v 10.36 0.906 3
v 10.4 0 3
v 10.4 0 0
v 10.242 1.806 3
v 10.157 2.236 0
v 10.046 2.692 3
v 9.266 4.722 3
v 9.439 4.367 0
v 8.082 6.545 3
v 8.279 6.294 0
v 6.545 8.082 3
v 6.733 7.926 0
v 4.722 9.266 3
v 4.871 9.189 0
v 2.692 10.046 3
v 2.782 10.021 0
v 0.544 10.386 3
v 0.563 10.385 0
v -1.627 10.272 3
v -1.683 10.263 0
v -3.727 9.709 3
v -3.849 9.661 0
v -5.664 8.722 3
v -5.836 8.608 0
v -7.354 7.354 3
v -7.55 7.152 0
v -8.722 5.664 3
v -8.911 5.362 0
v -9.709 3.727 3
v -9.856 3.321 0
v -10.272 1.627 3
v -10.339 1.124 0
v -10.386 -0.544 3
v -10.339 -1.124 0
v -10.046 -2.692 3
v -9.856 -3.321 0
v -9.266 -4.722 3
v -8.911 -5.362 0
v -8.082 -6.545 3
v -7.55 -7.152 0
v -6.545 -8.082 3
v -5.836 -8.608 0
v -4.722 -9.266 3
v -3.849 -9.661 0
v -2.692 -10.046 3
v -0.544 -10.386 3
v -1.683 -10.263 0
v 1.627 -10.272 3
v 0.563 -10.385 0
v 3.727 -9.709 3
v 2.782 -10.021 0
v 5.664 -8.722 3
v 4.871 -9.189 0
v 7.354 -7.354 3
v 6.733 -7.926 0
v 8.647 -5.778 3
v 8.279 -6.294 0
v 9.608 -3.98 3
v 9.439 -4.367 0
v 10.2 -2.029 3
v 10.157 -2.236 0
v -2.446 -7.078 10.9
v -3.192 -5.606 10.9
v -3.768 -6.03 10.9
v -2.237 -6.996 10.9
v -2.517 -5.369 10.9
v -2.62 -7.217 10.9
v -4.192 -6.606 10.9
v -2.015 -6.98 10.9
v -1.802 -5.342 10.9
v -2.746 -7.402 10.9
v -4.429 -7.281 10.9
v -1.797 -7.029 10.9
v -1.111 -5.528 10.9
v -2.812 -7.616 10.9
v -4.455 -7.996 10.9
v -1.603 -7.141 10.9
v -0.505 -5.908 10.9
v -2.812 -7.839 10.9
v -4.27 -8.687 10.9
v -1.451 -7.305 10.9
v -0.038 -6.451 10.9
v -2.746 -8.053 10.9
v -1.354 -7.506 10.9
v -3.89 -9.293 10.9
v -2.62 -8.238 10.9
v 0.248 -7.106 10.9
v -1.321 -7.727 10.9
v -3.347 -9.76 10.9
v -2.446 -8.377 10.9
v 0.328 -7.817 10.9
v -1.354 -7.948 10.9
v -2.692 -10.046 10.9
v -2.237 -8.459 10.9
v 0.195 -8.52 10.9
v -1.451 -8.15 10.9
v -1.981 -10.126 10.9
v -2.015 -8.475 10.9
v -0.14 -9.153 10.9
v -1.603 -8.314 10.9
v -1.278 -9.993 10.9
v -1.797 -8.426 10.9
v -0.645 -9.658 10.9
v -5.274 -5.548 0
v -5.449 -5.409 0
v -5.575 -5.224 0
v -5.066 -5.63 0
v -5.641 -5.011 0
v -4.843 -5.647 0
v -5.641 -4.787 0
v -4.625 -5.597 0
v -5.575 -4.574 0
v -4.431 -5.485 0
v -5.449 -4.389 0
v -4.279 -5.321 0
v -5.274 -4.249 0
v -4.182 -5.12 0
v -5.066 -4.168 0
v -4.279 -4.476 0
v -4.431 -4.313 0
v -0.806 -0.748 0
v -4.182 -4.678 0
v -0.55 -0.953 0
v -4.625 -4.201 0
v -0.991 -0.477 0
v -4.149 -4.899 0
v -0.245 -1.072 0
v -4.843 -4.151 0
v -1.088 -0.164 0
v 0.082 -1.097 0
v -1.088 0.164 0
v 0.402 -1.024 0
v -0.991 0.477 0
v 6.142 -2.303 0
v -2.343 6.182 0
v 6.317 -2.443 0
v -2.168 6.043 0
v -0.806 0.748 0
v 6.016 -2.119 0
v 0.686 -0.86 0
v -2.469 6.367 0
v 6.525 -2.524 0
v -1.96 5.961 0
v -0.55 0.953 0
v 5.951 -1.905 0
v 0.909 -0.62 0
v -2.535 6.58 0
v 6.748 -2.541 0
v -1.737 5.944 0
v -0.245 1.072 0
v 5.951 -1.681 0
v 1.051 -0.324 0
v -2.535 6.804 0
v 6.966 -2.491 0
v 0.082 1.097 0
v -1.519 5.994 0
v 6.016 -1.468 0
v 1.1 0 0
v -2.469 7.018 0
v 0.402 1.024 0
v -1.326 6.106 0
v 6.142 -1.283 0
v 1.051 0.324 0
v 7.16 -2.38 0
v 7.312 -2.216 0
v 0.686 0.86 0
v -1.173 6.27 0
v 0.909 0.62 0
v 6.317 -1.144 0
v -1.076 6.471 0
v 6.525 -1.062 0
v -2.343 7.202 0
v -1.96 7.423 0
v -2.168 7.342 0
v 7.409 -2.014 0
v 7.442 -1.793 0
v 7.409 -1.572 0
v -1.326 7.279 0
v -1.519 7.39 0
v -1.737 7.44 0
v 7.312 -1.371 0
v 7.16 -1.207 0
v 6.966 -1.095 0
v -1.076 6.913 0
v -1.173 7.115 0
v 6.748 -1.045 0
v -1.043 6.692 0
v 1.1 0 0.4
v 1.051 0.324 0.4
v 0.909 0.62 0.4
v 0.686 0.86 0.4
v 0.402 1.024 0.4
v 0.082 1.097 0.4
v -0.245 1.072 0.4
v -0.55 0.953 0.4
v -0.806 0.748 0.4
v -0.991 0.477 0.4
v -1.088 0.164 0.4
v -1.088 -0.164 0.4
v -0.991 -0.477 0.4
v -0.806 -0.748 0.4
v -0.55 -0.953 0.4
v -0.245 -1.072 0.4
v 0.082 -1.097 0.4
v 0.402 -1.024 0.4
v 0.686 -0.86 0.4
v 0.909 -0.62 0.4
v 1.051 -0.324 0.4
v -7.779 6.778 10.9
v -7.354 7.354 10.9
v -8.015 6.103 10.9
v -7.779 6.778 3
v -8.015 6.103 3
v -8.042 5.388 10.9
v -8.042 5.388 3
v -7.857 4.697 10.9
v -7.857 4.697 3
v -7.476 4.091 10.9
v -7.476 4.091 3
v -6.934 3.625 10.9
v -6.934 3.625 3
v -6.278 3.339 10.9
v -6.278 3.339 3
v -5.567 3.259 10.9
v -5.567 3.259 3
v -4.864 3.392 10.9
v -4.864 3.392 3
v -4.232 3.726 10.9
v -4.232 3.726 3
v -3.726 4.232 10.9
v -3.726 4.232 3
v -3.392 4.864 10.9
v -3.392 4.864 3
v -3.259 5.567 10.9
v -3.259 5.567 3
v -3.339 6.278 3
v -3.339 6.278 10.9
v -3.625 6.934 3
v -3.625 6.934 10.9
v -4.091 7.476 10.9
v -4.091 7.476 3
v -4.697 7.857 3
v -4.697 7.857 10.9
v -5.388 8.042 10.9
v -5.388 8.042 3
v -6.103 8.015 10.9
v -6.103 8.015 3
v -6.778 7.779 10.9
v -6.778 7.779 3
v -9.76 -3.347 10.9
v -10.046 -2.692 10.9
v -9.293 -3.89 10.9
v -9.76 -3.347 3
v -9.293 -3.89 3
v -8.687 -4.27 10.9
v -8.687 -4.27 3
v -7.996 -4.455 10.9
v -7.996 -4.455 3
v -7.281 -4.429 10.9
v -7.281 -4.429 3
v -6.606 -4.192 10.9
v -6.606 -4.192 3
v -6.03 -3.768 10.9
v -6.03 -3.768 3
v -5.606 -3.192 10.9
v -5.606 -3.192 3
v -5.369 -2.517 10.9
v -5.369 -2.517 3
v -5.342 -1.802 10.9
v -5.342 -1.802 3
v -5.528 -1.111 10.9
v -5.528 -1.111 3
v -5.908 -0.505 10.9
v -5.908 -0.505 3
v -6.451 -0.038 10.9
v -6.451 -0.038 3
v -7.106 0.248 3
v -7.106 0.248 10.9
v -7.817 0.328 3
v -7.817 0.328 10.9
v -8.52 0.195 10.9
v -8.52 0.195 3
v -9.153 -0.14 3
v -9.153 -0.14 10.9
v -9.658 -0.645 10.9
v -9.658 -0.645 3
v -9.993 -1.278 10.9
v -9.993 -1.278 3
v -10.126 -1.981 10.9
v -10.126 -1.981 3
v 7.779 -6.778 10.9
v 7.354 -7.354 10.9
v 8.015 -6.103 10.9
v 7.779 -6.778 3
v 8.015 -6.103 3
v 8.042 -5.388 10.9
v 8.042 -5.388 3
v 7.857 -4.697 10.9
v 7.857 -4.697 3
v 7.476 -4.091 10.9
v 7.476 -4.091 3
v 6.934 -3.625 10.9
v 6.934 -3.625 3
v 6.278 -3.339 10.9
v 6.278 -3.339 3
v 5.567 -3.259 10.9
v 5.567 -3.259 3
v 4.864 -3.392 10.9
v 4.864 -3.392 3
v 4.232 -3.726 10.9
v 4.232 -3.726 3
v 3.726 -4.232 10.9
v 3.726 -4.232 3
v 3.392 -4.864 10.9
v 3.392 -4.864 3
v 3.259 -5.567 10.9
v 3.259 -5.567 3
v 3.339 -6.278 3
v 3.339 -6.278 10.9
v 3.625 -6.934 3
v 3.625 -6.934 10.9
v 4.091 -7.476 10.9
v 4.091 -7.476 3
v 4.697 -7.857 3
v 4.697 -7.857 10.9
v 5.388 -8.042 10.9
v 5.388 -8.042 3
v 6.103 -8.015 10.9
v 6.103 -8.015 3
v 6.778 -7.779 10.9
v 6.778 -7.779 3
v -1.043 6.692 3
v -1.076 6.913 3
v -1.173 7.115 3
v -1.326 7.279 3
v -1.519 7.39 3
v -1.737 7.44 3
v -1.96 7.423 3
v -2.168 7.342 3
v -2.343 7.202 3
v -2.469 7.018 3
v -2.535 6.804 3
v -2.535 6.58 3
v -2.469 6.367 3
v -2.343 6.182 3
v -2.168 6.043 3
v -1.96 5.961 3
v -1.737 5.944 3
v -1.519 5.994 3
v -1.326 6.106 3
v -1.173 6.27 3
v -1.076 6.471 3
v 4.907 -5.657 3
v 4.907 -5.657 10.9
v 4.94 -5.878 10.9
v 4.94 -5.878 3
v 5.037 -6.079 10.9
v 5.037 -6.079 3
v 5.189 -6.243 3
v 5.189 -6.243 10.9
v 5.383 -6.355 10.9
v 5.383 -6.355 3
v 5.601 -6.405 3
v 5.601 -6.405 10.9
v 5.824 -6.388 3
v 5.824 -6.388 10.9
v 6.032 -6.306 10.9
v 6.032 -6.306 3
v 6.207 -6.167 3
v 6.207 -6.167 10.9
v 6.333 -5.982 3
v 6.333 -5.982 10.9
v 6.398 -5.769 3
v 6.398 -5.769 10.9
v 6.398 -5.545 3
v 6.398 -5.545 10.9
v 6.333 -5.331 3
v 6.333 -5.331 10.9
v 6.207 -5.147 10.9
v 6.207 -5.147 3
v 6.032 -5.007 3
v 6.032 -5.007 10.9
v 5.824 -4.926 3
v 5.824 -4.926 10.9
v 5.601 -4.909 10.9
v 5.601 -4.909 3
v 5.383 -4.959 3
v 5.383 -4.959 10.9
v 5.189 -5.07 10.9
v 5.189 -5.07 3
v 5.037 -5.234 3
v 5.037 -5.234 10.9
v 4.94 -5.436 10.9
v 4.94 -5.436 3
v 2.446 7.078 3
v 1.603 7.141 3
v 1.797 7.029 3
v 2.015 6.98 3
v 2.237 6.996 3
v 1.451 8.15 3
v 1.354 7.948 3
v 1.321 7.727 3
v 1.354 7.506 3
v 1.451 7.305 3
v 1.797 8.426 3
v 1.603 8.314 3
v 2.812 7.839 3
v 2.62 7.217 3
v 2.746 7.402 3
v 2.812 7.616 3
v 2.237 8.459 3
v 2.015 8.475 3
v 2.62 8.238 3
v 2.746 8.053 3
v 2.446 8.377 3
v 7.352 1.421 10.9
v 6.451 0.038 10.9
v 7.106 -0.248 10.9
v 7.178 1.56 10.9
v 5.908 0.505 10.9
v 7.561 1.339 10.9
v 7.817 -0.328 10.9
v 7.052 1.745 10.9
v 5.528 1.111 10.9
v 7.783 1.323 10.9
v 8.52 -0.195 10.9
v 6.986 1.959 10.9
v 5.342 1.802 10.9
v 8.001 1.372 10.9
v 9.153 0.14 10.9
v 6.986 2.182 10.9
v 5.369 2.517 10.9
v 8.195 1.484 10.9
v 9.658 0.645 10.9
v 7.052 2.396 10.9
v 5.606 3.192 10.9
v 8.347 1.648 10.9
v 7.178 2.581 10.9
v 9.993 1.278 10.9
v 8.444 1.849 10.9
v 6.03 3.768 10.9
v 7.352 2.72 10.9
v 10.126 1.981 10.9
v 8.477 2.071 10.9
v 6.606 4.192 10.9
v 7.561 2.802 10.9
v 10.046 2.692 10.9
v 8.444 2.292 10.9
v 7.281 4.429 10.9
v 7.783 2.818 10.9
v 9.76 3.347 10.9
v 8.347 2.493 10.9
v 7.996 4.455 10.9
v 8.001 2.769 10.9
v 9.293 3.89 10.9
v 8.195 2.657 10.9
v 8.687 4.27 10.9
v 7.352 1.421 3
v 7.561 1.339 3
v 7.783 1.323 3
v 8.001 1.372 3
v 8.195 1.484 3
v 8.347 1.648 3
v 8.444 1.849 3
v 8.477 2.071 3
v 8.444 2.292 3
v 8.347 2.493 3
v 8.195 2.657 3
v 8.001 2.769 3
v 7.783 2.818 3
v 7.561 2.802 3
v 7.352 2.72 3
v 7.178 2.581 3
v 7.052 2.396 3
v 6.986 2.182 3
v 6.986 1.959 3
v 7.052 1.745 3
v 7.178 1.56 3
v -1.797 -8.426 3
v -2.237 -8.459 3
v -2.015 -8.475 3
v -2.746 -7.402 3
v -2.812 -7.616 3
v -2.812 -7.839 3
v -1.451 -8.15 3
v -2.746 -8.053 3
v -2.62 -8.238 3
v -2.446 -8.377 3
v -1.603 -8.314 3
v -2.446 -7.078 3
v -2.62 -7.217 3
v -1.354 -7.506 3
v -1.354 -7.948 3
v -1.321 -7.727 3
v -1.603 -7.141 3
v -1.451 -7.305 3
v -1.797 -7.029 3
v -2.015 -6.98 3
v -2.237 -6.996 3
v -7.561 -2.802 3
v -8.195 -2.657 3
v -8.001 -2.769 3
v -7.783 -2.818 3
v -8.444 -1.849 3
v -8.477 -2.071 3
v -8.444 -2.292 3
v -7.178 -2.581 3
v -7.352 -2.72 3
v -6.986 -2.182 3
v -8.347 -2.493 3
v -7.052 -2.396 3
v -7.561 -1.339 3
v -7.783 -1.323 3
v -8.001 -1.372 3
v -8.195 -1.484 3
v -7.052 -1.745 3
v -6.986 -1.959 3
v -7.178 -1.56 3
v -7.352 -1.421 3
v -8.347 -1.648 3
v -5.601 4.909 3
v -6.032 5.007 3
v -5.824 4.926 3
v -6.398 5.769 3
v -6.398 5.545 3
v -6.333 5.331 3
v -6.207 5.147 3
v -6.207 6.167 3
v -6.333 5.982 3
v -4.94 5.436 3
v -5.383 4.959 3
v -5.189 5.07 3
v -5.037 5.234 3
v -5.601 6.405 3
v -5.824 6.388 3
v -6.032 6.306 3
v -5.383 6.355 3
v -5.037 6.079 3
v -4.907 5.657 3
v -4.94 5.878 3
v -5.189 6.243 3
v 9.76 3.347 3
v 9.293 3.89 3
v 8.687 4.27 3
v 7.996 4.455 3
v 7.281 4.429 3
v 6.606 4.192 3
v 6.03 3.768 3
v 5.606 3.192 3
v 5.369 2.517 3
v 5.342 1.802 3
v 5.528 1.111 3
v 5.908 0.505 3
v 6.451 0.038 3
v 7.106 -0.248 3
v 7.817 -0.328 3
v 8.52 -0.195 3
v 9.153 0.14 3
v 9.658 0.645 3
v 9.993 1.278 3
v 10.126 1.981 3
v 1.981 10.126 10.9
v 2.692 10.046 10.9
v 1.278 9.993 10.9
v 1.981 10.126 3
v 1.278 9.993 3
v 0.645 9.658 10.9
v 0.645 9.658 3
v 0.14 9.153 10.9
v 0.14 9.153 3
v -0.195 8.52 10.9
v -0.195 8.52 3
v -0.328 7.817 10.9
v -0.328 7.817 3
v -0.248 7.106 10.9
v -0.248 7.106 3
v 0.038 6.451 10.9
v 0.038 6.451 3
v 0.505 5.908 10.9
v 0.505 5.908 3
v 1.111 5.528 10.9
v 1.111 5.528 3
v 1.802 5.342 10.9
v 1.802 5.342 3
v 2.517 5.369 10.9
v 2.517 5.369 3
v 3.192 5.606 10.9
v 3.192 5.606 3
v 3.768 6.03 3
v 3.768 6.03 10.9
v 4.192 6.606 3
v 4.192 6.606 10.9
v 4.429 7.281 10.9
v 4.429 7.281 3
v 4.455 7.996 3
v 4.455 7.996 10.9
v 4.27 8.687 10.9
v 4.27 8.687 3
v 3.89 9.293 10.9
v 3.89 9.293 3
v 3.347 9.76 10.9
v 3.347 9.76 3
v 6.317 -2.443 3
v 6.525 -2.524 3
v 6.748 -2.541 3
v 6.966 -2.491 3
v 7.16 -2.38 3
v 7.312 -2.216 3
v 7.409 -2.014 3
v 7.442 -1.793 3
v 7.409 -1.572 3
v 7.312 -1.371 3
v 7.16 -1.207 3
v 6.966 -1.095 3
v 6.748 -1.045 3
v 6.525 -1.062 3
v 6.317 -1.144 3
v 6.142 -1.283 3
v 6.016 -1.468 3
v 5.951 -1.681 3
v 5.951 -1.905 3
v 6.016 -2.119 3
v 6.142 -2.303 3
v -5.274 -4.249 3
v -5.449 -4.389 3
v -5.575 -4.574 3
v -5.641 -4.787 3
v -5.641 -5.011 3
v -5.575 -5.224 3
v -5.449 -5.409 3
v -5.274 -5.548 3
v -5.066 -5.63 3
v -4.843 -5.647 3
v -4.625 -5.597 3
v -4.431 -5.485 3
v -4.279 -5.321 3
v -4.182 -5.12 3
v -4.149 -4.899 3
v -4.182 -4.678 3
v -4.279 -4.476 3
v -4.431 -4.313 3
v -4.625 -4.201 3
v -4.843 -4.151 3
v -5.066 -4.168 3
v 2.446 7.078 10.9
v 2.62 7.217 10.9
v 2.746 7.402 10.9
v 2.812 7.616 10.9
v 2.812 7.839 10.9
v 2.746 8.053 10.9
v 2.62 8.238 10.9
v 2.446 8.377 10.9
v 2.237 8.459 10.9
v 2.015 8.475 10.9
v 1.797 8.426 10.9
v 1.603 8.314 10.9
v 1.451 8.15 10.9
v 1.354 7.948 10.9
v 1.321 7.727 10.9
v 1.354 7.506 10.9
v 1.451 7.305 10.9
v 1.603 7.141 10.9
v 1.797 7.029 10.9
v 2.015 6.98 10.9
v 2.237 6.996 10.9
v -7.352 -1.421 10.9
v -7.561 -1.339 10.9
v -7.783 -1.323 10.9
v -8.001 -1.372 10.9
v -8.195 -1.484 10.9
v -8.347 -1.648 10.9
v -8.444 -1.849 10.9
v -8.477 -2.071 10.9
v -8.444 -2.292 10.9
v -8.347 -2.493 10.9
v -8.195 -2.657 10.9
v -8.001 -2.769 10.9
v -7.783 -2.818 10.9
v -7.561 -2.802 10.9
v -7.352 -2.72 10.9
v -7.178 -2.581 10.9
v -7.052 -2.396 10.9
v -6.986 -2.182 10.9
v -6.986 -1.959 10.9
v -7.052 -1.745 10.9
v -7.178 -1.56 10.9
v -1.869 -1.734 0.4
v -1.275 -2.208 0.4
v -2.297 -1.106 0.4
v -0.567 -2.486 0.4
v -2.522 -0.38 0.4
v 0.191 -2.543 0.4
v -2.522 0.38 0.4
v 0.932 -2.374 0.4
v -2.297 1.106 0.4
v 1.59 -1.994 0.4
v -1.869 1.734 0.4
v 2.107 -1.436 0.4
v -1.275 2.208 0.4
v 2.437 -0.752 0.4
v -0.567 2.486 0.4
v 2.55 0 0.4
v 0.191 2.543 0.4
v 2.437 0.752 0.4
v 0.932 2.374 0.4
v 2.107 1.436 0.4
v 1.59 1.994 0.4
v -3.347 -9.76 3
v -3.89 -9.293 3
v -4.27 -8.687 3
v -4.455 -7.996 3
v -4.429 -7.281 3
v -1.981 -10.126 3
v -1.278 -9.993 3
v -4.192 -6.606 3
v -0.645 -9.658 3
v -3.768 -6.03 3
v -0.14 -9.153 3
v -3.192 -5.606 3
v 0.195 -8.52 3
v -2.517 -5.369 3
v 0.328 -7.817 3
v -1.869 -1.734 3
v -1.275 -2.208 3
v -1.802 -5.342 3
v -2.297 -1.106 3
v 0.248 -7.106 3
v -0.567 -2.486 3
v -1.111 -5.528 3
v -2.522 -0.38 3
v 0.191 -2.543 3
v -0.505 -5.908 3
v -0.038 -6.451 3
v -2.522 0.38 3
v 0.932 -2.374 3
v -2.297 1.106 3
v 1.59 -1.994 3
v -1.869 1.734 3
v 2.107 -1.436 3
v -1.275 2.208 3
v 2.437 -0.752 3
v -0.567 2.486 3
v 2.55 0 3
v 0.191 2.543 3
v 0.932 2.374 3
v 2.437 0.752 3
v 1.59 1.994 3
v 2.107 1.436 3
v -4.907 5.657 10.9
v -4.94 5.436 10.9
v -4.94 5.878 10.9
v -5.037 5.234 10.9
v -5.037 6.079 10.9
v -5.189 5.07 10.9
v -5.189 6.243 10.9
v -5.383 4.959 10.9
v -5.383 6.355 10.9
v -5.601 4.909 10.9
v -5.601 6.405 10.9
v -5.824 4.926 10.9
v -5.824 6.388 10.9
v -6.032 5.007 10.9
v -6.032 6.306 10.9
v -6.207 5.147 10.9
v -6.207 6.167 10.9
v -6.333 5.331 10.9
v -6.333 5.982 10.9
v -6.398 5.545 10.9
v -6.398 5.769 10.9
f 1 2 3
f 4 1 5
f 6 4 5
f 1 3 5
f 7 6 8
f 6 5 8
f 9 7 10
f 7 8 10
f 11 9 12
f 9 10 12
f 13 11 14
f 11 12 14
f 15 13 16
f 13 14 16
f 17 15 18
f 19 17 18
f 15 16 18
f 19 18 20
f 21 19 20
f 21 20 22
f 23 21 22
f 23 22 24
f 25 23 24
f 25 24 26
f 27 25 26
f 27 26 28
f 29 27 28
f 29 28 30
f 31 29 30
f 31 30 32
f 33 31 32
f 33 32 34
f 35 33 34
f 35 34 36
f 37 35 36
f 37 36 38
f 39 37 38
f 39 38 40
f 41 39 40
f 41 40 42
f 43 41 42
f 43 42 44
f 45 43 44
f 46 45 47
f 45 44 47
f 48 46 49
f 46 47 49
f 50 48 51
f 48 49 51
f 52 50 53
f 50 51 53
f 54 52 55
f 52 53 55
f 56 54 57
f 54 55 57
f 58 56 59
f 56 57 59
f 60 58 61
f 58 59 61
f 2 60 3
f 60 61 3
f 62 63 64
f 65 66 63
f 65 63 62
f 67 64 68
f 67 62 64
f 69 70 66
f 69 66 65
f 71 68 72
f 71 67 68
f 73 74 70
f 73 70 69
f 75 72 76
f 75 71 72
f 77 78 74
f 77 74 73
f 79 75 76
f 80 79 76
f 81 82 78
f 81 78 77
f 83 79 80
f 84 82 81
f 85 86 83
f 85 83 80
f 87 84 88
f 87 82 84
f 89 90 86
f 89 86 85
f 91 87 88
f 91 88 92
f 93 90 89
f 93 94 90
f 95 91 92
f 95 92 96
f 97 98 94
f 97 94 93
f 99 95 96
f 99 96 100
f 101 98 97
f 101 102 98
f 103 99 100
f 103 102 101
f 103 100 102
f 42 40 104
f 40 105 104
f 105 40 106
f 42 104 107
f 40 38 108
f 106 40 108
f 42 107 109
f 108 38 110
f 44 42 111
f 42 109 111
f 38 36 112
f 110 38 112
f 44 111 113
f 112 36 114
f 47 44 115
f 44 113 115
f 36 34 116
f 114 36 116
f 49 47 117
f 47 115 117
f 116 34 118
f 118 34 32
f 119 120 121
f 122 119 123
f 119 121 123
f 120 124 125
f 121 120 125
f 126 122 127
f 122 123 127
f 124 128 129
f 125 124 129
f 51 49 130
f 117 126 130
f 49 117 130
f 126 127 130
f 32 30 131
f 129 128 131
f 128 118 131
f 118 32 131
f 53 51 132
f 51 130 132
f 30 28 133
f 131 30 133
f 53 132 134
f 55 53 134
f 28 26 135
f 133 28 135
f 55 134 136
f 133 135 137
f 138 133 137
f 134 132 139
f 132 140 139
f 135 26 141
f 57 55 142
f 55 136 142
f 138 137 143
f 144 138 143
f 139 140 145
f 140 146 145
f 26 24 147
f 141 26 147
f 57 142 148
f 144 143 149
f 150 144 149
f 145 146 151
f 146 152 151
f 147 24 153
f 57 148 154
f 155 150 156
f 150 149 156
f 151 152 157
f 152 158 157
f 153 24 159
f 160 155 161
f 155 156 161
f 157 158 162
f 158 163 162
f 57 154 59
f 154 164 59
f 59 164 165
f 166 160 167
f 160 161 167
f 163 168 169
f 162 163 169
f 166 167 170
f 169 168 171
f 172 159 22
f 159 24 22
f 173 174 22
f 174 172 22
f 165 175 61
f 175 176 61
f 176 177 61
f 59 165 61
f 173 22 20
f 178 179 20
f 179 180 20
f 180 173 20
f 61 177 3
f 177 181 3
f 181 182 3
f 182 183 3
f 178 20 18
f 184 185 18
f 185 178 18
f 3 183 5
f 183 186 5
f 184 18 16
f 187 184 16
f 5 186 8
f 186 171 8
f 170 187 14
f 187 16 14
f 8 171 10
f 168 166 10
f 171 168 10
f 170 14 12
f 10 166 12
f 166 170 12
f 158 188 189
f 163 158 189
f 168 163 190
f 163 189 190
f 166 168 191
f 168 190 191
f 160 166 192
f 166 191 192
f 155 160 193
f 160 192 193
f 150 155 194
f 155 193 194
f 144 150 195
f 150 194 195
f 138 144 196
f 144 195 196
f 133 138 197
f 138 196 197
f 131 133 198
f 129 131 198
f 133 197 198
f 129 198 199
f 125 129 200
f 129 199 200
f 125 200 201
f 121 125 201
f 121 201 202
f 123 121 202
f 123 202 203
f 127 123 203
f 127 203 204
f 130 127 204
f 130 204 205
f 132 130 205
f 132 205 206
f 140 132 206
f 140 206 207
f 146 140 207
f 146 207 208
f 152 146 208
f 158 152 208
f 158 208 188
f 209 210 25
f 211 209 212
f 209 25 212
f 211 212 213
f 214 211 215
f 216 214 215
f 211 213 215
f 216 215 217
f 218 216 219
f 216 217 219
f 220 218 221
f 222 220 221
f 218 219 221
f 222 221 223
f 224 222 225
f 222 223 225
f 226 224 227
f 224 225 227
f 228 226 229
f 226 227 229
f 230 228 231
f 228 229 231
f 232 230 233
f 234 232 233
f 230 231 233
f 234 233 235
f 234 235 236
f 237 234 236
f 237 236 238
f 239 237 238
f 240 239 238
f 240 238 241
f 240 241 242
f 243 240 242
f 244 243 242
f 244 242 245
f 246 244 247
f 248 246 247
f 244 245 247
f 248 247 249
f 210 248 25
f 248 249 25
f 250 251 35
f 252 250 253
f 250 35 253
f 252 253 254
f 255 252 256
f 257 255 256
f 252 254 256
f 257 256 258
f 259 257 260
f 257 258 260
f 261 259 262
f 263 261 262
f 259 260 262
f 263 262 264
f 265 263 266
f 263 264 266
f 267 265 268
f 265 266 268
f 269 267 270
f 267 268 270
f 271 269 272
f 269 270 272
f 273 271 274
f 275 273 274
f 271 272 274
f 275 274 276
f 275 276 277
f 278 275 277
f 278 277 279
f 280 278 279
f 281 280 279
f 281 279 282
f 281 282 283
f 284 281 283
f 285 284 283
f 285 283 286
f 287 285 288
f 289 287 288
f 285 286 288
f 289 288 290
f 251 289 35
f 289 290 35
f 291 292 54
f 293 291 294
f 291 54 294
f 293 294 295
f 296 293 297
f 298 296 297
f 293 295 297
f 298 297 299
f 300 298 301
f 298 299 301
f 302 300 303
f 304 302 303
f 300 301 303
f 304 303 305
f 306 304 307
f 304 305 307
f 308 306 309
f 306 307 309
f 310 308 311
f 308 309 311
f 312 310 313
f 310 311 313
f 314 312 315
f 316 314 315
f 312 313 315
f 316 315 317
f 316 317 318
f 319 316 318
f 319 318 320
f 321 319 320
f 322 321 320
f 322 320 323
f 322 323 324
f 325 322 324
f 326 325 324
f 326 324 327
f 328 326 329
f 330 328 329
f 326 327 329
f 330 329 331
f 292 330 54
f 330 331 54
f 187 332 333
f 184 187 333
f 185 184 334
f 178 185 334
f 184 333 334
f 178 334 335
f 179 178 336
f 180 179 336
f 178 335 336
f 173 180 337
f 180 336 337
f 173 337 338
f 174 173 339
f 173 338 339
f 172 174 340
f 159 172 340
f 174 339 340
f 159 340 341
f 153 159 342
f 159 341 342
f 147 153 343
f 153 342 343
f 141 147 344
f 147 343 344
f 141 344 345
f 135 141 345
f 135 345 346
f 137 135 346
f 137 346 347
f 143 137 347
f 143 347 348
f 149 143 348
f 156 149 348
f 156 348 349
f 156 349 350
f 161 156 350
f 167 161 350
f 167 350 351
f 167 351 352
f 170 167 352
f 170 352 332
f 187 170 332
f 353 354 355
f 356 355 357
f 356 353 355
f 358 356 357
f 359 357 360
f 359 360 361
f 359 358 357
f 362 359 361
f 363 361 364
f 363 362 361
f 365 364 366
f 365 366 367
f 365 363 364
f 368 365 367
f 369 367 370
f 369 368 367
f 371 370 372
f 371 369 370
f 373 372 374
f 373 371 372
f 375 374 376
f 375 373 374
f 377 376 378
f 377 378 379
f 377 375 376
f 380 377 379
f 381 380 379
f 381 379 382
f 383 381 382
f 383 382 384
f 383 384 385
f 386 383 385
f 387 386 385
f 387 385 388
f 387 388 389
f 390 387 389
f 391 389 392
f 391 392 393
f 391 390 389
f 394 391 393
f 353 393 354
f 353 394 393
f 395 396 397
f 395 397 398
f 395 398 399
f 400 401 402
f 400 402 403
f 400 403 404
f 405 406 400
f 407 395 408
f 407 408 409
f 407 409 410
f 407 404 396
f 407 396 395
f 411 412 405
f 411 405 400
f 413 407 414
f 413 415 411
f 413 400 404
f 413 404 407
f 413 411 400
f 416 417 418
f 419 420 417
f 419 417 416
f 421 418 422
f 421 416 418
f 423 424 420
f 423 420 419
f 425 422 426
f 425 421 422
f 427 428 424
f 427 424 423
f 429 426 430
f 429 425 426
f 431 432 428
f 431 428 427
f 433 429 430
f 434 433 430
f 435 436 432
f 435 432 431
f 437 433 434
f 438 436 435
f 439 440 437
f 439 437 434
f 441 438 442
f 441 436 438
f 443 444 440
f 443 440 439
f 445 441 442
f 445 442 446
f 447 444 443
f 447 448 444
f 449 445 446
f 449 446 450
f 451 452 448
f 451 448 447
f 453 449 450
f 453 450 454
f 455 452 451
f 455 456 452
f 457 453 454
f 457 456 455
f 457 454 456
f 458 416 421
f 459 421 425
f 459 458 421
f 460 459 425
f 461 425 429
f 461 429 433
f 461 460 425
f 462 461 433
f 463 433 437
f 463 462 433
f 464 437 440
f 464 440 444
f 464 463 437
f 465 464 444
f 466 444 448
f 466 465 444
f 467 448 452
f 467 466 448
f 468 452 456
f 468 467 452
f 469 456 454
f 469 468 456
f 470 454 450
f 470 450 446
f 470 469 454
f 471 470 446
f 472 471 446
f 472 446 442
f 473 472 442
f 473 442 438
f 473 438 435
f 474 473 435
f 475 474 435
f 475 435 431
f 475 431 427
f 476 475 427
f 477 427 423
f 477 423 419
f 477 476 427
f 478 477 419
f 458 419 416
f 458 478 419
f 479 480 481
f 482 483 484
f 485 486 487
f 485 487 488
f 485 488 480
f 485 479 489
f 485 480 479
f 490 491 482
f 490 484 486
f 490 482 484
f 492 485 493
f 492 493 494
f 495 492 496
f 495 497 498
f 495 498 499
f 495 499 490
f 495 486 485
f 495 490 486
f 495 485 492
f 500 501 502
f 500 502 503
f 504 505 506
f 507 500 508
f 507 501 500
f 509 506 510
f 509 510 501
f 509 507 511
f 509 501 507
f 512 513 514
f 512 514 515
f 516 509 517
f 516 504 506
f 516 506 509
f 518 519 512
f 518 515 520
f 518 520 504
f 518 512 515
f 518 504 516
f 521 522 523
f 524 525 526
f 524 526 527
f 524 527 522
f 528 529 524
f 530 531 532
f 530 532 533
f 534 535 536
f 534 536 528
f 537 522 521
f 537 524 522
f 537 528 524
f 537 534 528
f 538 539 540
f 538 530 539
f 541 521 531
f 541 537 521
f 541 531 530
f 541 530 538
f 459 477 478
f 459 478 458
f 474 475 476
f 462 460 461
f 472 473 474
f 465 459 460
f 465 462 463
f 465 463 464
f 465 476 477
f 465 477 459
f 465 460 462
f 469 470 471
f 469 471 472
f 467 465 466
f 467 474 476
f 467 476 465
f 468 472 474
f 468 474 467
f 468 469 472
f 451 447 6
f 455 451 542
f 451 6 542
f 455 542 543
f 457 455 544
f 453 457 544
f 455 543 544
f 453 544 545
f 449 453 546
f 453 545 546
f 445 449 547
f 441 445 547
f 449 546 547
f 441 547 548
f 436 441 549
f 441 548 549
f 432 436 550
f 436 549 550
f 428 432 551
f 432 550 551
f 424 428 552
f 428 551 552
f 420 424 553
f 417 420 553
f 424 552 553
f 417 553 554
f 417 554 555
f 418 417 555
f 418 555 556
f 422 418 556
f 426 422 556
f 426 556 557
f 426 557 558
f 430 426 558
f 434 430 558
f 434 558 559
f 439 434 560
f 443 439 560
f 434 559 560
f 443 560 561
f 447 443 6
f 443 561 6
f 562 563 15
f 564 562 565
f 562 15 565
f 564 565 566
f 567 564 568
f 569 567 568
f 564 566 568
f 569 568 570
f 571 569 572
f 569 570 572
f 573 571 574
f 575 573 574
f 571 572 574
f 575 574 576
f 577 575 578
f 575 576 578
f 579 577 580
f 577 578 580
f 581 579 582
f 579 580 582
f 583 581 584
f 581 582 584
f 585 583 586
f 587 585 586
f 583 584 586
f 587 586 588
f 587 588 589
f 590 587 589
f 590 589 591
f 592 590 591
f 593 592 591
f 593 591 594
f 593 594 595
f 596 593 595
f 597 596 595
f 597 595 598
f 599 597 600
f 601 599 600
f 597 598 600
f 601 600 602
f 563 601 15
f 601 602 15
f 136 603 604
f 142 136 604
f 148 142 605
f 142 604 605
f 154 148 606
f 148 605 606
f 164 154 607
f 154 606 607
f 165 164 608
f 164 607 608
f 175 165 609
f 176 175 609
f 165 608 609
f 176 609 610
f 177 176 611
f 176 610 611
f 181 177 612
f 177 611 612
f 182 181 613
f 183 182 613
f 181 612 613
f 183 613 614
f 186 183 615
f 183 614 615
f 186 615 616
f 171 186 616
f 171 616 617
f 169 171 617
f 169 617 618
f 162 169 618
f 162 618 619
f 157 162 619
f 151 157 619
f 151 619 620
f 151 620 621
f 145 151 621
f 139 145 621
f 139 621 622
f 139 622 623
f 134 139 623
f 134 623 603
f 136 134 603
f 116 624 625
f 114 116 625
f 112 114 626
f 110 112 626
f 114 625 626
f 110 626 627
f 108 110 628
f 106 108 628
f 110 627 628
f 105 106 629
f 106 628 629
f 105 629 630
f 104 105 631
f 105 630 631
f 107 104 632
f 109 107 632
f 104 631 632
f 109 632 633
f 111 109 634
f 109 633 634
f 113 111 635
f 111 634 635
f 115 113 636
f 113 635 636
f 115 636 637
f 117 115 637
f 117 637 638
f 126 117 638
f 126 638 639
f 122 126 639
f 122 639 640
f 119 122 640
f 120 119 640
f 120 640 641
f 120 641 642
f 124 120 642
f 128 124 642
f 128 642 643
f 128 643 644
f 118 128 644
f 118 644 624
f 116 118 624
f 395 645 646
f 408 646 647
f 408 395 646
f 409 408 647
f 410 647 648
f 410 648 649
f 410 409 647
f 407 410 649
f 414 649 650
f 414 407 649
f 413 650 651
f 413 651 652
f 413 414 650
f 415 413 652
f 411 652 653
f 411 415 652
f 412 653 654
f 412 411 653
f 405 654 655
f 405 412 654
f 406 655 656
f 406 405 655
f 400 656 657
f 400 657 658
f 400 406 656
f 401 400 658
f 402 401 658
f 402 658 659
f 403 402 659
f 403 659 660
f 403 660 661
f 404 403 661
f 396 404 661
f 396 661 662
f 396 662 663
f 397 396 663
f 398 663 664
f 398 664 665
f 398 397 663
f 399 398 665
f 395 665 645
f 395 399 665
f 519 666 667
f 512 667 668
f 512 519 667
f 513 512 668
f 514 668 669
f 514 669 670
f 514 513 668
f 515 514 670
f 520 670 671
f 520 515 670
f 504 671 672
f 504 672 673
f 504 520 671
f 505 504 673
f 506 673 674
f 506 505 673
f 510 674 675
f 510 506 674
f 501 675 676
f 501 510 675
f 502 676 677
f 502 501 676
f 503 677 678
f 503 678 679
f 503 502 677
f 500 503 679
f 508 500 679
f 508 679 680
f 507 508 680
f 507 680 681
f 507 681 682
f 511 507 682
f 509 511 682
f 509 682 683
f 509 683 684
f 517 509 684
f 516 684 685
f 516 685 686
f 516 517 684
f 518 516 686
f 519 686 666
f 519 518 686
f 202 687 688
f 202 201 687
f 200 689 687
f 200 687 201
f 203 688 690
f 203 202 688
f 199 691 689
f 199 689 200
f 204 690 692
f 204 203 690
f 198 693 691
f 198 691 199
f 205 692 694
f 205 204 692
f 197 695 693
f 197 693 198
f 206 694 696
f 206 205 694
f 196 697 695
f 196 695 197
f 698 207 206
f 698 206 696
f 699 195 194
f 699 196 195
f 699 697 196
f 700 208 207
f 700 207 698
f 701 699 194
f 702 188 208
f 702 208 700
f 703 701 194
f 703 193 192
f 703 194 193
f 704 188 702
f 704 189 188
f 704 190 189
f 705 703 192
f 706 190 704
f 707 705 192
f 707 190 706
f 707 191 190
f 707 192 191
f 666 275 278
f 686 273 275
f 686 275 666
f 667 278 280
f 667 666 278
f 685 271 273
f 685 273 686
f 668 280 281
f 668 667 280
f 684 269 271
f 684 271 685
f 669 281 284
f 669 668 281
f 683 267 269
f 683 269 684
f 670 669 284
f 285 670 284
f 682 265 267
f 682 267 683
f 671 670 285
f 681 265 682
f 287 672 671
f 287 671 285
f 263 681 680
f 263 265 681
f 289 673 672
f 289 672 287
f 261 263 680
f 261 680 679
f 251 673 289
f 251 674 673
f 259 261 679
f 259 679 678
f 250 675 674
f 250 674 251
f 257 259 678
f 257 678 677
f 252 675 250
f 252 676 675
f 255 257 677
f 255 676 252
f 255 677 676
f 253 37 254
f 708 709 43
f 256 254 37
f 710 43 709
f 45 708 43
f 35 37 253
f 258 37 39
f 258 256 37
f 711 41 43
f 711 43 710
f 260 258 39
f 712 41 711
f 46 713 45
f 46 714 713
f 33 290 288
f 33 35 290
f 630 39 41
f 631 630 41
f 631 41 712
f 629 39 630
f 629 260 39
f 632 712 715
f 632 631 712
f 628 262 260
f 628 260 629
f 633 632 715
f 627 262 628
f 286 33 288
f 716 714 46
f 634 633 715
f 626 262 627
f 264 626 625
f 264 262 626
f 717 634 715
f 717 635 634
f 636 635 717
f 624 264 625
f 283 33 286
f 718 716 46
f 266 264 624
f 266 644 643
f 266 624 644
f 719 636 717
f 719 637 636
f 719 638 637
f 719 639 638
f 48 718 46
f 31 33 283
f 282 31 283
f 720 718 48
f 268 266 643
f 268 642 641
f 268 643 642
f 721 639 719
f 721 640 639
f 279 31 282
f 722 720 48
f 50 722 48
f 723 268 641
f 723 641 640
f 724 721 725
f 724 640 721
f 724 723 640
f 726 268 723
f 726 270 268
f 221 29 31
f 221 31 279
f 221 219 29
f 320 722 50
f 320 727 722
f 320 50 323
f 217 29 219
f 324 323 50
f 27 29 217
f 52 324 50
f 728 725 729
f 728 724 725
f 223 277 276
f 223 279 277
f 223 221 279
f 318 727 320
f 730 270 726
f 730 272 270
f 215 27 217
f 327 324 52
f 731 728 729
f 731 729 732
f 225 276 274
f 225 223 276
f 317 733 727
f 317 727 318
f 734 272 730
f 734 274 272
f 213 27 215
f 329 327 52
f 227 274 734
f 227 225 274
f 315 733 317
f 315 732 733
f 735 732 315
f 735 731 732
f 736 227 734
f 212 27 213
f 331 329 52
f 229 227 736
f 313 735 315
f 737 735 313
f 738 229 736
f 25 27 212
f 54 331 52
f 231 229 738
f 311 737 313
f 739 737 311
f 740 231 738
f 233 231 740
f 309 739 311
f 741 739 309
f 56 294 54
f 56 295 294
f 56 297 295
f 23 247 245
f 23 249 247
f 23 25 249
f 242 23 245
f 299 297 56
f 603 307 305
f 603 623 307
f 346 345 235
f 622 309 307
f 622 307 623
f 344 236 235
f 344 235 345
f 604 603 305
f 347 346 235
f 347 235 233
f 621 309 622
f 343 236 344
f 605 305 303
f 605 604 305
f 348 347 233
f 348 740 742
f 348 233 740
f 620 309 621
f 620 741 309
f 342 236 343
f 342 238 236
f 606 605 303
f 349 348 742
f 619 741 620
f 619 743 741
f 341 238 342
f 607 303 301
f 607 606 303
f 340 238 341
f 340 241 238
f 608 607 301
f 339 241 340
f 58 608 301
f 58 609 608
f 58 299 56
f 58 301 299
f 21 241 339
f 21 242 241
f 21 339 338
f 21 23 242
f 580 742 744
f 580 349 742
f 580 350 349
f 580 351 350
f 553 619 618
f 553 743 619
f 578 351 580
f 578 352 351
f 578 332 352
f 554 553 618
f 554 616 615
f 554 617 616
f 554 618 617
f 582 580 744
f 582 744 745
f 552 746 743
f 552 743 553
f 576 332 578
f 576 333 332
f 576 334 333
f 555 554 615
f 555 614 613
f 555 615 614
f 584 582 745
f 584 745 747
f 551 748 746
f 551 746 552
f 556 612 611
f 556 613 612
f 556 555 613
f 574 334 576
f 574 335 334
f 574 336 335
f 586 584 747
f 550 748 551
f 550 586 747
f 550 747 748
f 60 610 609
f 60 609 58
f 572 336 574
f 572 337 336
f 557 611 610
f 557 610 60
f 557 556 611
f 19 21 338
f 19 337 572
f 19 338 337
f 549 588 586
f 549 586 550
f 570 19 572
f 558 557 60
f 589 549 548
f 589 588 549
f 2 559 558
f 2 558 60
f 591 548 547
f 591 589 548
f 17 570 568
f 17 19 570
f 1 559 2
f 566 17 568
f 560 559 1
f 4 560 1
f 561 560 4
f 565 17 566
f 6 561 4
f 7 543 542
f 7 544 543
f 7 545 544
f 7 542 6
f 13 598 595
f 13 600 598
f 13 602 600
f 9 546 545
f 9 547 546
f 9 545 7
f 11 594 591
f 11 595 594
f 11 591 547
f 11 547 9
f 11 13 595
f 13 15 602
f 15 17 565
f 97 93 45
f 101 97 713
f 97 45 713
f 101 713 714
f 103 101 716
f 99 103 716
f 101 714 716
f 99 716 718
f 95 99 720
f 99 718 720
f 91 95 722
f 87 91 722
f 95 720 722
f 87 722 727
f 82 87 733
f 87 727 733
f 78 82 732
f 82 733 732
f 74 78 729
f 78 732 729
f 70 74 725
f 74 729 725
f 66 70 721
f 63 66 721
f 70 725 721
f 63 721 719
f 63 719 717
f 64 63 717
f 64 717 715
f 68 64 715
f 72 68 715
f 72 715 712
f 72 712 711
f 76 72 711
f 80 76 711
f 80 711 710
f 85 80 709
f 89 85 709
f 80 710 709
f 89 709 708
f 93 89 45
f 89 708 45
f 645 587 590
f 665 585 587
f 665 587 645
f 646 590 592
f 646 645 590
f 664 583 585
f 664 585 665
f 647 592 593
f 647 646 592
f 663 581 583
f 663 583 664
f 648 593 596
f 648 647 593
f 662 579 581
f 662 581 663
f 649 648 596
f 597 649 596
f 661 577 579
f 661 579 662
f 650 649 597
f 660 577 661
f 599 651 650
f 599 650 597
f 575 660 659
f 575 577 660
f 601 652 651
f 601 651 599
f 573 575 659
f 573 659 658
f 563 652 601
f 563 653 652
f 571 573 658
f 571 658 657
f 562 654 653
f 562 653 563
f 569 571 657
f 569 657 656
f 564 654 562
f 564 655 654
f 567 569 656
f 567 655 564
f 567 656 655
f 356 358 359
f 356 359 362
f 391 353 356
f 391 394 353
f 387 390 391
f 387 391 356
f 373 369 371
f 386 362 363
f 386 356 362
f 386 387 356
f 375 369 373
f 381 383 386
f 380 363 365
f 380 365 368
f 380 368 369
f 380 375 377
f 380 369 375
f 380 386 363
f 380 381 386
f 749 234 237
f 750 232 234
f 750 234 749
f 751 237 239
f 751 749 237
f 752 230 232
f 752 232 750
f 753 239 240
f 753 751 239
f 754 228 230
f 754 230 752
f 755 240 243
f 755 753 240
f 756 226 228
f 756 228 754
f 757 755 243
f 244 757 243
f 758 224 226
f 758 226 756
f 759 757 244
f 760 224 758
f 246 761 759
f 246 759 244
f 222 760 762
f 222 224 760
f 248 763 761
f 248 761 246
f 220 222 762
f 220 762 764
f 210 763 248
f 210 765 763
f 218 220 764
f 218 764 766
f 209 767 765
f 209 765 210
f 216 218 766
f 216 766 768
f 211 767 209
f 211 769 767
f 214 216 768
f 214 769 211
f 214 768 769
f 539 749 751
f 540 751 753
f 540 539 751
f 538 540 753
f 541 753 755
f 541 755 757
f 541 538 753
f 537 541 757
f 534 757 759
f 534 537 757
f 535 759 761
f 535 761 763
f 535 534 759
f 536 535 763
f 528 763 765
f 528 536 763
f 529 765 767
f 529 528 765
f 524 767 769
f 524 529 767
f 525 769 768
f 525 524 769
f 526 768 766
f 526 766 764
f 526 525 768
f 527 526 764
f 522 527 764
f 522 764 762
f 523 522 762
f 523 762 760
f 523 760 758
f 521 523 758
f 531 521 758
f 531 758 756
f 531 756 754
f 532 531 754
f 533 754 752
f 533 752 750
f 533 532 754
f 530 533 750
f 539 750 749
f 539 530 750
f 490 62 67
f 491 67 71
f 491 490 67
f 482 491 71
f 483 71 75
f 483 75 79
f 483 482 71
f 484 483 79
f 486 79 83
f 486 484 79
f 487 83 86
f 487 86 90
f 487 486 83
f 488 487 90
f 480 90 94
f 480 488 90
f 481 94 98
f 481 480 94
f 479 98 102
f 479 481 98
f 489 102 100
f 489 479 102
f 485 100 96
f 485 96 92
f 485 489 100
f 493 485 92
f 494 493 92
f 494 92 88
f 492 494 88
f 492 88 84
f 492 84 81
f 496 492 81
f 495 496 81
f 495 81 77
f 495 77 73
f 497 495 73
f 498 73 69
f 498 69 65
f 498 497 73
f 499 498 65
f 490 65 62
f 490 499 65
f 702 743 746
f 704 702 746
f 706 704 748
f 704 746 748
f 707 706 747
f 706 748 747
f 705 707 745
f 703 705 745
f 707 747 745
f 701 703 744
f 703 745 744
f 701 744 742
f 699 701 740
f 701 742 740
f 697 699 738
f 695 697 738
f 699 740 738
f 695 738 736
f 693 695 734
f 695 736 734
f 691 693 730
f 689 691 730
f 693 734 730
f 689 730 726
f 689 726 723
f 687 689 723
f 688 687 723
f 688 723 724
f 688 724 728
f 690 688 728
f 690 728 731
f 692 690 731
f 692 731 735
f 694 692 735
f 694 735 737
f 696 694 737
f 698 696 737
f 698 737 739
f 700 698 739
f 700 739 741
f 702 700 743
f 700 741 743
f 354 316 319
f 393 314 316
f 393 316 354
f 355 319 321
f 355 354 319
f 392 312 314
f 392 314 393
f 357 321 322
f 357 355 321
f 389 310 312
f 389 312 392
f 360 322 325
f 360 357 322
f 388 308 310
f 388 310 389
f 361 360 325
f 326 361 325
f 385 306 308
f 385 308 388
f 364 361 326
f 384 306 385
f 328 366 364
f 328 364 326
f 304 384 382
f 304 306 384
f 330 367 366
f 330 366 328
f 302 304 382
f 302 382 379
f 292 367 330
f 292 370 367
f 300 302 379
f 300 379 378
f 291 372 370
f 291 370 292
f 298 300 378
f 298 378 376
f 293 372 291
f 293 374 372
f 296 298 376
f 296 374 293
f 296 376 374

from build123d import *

# Parameters (mm, degrees)
SKETCH_1_R               = 10.4
EXTRUDE_1_DEPTH          = 3
SKETCH_3_R               = 2.4
SKETCH_3_R_2             = 0.75
EXTRUDE_3_DEPTH          = 7.9
PATTERN_CIRCULAR_1_COUNT = 6
SKETCH_4_R               = 0.75
CUT_EXTRUDE_1_DEPTH      = 17.695208894
PATTERN_CIRCULAR_2_COUNT = 3
SKETCH_5_R               = 1.1
CUT_EXTRUDE_2_DEPTH      = 17.695208894
SKETCH_5_4_R             = 2.55
SKETCH_5_4_R_2           = 1.1
CUT_EXTRUDE_3_DEPTH      = 2.6


with BuildPart() as part:
    # 草图1 → 凸台-拉伸1 (new body)
    with BuildSketch(Plane.XY):
        Circle(SKETCH_1_R)
    extrude(amount=EXTRUDE_1_DEPTH)

    # 草图3 → 凸台-拉伸3 (add)
    with BuildSketch(Plane.XY.offset(3)):
        with Locations((-5.656854249, 5.656854249)):
            Circle(SKETCH_3_R)
        with Locations((-5.656854249, 5.656854249)):
            Circle(SKETCH_3_R_2, mode=Mode.SUBTRACT)
    extrude_3 = extrude(amount=EXTRUDE_3_DEPTH)

    # 阵列(圆周)1: 凸台-拉伸3 ×6 about axis
    pattern_circular_1_axis = Axis((0, 0, 3), (0, 0, -1))
    for i in range(1, PATTERN_CIRCULAR_1_COUNT):
        add(extrude_3.rotate(pattern_circular_1_axis, i * 360 / PATTERN_CIRCULAR_1_COUNT))

    # 草图4 → 切除-拉伸1 (cut, through all)
    with BuildSketch(Plane.XY.offset(3)):
        with Locations((-1.793150944, 6.69213043)):
            Circle(SKETCH_4_R)
    cut_extrude_1 = extrude(amount=-CUT_EXTRUDE_1_DEPTH, mode=Mode.SUBTRACT)

    # 阵列(圆周)2: 切除-拉伸1 ×3 about axis
    pattern_circular_2_axis = Axis((0, 0, 3), (0, 0, -1))
    for i in range(1, PATTERN_CIRCULAR_2_COUNT):
        add(cut_extrude_1.rotate(pattern_circular_2_axis, i * 360 / PATTERN_CIRCULAR_2_COUNT), mode=Mode.SUBTRACT)

    # 草图5 → 切除-拉伸2 (cut, through all)
    with BuildSketch(Plane.XY.offset(3)):
        Circle(SKETCH_5_R)
    extrude(amount=-CUT_EXTRUDE_2_DEPTH, mode=Mode.SUBTRACT)

    # 草图5<4> → 切除-拉伸3 (cut)
    with BuildSketch(Plane.XY.offset(3)):
        Circle(SKETCH_5_4_R)
        Circle(SKETCH_5_4_R_2, mode=Mode.SUBTRACT)
    extrude(amount=-CUT_EXTRUDE_3_DEPTH, mode=Mode.SUBTRACT)


solid = part.part
